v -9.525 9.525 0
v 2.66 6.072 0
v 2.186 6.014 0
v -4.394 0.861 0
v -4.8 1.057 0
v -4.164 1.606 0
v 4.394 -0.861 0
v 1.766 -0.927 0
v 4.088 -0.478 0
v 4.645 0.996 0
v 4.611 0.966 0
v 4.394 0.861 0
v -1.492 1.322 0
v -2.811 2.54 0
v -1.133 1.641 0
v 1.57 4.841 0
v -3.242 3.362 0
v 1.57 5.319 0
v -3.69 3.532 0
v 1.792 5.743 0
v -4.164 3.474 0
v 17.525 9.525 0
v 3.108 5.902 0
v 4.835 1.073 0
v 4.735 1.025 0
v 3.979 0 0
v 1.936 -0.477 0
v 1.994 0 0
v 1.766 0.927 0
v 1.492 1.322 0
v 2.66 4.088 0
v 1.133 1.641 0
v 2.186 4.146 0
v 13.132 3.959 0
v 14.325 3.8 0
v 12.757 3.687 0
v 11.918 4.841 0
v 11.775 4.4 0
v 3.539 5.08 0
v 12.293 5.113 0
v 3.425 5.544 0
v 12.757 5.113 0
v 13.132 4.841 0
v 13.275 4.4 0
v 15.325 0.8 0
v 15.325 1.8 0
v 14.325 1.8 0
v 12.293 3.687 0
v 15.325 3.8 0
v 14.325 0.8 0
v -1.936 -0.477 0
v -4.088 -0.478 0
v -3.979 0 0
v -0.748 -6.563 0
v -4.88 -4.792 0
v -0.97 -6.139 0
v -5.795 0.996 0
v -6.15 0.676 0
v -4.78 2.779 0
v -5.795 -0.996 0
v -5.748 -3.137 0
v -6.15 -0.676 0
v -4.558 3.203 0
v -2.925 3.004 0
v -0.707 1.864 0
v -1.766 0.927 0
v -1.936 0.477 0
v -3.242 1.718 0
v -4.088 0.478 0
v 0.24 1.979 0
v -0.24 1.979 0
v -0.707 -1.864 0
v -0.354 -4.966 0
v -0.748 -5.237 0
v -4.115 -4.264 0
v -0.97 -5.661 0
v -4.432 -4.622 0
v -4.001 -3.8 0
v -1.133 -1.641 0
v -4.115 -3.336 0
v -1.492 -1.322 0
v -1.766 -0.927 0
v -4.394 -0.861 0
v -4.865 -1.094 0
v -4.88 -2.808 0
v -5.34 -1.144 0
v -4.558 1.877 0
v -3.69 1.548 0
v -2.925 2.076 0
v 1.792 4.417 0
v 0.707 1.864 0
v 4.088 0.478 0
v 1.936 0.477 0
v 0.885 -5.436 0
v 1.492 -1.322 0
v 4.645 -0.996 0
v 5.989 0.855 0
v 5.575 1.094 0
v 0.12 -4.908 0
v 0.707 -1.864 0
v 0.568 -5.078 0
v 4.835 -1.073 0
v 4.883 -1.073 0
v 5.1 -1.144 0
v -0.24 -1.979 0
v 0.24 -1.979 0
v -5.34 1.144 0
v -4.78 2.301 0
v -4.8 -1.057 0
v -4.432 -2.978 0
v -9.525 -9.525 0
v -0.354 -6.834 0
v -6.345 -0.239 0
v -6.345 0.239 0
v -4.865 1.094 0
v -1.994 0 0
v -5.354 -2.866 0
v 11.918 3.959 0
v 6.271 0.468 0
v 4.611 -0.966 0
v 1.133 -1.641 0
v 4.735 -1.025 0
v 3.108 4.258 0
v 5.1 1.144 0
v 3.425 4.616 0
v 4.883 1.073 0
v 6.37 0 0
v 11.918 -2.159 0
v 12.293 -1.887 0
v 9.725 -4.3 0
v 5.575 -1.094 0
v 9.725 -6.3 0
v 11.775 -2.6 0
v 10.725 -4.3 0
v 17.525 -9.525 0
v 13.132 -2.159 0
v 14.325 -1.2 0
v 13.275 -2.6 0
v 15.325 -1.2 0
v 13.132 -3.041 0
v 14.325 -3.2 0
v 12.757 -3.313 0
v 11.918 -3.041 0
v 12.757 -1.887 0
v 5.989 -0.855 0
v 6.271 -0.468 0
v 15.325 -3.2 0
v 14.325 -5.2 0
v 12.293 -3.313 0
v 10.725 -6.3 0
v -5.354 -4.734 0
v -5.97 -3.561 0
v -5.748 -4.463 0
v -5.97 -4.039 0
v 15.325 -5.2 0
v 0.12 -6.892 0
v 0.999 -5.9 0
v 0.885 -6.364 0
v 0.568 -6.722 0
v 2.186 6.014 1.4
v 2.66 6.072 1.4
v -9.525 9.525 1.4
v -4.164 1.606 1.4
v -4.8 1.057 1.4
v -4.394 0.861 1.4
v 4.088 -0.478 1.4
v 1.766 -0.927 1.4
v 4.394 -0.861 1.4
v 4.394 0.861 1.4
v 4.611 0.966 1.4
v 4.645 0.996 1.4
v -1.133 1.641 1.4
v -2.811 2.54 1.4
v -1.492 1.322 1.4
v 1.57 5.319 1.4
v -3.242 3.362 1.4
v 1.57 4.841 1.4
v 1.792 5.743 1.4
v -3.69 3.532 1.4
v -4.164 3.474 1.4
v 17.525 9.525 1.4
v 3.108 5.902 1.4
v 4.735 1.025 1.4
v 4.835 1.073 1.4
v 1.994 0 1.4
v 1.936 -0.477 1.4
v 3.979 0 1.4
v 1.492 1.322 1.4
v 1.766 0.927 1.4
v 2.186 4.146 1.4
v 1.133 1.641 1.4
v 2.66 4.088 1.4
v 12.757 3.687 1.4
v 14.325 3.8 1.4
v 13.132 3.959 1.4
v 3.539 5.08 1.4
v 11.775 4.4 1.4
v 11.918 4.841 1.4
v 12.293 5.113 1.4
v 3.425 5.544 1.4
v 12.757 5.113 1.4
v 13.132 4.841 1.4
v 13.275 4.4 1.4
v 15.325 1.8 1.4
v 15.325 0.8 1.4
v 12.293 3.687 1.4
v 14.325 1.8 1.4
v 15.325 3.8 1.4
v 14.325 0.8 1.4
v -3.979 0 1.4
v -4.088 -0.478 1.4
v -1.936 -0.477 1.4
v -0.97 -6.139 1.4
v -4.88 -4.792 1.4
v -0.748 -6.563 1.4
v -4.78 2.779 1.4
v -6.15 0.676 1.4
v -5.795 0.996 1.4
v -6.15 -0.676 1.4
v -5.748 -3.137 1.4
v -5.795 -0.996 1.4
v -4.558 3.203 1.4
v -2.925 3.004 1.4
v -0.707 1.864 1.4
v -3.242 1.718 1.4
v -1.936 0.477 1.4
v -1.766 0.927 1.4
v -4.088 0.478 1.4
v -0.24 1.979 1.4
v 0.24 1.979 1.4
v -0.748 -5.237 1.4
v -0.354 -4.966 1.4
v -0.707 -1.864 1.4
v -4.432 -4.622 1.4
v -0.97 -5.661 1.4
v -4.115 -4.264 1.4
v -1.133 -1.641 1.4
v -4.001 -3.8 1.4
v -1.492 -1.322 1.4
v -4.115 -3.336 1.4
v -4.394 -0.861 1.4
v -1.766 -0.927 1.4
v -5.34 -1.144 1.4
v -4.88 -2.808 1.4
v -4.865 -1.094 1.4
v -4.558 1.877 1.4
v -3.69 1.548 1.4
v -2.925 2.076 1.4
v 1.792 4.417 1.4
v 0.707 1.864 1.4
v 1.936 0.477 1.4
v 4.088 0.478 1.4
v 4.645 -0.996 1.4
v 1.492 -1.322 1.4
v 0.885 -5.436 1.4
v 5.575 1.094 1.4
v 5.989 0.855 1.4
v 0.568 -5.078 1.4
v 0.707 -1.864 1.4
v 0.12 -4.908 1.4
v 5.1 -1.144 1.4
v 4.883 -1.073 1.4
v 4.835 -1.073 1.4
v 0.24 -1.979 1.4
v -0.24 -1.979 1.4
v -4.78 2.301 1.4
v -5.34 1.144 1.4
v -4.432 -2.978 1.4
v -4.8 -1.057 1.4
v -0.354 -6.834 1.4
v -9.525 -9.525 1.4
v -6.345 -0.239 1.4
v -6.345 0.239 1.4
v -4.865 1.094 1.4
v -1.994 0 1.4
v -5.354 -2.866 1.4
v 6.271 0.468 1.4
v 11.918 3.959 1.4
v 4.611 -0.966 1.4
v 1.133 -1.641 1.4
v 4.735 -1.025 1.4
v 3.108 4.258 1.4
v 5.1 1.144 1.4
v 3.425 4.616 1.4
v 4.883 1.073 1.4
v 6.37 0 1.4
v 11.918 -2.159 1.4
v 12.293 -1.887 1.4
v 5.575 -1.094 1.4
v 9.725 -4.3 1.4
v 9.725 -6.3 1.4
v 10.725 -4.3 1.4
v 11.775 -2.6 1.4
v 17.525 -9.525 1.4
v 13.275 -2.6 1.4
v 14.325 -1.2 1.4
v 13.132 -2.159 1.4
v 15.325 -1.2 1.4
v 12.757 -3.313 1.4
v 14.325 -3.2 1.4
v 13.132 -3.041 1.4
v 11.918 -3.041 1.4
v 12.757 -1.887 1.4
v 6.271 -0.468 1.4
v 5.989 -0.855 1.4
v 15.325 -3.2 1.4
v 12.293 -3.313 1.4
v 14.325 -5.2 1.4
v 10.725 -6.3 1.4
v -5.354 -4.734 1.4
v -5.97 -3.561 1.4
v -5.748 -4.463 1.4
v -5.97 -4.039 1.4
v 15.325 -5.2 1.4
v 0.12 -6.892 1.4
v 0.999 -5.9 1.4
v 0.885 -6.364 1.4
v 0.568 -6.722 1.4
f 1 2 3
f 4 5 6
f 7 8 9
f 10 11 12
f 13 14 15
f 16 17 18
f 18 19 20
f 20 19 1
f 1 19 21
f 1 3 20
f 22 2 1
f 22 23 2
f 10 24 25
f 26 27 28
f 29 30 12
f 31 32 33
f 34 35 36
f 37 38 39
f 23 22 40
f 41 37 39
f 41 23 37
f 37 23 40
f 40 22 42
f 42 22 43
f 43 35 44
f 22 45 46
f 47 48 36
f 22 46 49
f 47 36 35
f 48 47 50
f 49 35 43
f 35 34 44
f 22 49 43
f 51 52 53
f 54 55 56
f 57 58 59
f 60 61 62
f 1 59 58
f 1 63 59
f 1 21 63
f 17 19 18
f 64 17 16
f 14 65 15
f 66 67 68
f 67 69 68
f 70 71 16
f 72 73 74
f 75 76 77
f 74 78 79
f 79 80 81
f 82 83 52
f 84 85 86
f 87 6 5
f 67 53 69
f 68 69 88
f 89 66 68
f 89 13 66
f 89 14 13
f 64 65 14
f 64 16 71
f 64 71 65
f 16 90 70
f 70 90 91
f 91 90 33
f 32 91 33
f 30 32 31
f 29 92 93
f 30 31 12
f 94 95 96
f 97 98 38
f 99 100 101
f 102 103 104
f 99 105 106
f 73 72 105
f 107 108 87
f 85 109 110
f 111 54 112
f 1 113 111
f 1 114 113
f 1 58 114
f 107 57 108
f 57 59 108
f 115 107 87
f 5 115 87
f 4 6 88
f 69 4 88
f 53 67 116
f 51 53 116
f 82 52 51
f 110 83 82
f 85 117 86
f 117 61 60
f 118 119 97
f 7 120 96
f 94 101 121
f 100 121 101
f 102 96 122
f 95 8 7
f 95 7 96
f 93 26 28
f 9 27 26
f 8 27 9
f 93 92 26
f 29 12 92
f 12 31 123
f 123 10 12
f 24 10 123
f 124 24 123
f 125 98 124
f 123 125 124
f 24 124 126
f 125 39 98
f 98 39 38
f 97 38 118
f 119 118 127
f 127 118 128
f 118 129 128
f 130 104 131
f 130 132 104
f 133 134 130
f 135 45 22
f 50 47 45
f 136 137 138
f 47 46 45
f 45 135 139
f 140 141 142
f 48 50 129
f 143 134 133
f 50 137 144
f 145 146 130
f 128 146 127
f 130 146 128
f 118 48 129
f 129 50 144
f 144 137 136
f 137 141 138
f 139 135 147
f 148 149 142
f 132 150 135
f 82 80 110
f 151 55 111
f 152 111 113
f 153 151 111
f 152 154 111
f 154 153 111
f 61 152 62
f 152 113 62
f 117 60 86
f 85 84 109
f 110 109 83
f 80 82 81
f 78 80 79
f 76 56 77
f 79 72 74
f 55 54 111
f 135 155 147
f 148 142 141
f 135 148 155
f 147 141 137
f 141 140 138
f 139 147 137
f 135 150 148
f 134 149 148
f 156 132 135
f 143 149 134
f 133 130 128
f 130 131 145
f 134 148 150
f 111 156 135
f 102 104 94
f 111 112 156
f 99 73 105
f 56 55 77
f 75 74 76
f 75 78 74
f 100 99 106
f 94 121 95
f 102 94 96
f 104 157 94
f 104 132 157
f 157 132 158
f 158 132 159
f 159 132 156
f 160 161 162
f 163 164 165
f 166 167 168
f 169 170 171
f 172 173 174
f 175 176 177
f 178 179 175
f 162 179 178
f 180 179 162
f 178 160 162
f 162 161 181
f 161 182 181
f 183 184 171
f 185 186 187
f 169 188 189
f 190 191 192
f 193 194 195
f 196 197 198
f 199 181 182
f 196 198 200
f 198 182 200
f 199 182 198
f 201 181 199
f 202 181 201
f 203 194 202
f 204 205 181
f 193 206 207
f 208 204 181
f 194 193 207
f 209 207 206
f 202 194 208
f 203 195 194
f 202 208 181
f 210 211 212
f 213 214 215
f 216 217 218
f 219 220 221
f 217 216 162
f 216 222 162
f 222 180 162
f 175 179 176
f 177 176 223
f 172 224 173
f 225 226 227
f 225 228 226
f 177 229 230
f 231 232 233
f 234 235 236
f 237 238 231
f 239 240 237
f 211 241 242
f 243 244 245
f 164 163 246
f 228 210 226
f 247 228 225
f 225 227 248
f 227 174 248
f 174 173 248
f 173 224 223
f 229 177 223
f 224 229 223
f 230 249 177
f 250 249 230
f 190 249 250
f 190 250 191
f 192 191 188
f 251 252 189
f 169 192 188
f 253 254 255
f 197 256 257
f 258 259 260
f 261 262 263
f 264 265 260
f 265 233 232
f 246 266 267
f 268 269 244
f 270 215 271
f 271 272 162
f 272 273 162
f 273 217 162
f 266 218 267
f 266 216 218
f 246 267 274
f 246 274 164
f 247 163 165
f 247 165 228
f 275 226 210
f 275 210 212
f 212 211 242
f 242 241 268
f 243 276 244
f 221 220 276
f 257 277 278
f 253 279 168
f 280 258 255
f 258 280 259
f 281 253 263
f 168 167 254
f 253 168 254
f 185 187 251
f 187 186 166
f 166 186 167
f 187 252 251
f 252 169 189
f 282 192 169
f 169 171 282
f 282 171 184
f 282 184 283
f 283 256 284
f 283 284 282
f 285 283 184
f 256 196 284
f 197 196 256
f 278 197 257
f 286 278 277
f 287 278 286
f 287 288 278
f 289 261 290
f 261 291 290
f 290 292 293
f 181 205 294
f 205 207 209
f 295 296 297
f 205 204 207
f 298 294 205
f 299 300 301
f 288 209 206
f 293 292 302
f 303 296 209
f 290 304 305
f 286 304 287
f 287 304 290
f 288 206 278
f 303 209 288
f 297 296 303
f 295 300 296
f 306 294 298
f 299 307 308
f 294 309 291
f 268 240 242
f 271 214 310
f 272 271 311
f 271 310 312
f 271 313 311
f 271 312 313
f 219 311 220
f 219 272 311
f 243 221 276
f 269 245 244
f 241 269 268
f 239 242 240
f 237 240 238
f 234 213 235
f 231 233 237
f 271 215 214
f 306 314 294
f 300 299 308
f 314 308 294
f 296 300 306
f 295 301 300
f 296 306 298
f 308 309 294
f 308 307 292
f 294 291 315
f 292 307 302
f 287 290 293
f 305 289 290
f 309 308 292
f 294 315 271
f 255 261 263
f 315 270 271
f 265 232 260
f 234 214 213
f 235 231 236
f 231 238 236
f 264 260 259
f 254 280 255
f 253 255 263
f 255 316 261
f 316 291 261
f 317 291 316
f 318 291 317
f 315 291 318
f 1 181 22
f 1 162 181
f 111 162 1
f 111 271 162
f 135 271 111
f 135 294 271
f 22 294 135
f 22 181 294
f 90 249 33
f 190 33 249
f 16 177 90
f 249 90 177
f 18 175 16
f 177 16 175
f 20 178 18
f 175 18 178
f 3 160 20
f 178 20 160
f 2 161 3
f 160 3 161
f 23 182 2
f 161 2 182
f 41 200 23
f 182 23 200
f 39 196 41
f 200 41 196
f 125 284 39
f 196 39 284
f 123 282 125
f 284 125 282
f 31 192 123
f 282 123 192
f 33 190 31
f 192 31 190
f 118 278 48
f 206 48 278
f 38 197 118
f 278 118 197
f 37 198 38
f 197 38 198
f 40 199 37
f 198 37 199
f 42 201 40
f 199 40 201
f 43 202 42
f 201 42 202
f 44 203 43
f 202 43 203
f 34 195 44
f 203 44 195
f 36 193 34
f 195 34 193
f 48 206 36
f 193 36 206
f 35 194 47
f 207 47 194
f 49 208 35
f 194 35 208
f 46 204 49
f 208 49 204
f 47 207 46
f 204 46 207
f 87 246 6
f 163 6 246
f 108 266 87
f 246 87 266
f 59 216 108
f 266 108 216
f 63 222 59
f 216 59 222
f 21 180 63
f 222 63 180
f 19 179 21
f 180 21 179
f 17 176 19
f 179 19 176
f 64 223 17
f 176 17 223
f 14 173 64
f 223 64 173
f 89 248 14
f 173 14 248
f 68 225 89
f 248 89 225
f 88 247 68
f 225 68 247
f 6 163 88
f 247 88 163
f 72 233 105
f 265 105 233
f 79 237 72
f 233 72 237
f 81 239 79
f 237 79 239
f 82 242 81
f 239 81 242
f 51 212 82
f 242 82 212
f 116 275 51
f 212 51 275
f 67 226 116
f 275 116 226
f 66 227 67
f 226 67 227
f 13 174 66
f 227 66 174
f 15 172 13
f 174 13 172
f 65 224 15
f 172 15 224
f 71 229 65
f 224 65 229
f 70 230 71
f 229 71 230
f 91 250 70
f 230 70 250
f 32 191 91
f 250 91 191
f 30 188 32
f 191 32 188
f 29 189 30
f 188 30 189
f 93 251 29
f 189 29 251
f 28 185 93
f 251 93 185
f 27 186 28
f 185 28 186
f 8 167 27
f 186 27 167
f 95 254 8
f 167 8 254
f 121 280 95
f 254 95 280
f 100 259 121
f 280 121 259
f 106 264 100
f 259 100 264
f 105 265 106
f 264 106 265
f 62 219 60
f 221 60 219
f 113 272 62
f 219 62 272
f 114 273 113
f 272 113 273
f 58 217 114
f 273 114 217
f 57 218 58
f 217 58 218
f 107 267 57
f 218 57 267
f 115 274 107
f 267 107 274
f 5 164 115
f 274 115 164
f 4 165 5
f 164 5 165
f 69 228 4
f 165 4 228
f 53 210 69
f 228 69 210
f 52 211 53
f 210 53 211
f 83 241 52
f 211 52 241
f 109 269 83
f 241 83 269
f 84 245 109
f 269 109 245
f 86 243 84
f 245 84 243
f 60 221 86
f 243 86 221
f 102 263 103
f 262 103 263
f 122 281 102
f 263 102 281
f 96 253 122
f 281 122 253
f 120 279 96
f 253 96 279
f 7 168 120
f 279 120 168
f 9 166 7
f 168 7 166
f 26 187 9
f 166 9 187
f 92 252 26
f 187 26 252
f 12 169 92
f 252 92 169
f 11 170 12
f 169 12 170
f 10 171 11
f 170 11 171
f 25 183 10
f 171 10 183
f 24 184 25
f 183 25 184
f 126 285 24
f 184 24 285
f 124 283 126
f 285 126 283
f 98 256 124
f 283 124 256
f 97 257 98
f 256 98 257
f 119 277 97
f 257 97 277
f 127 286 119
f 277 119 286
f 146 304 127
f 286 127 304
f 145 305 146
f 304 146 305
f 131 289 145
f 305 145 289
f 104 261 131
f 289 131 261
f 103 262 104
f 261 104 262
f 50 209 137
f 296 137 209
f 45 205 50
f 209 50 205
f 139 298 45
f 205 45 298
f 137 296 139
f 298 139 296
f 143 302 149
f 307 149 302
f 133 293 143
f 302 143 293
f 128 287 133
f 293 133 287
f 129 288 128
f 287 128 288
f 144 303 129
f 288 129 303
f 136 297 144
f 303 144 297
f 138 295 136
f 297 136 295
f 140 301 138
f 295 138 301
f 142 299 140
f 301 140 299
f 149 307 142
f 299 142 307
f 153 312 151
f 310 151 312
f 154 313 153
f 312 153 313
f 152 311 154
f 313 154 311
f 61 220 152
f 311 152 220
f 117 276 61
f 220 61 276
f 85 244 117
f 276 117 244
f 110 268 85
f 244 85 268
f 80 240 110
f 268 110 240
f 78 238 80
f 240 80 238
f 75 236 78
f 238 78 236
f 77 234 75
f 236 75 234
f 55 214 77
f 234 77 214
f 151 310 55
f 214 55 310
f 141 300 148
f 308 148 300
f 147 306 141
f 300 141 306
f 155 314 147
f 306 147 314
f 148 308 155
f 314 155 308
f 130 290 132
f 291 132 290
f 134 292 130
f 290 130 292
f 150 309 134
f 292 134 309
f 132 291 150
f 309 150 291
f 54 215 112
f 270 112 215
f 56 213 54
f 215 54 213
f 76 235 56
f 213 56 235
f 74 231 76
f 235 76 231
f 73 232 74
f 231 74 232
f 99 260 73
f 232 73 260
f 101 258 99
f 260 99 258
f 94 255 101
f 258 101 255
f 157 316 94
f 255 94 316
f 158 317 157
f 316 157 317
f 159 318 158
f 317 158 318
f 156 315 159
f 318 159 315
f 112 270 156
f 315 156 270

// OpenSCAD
$fs=0.5;
$fa=1;
in=25.4;
g=0.05*in;
e=0.5;// added diameter to switch holes

linear_extrude(1.4) {
     difference() {
          union() {
               square(19.05, center=true);
               translate([19.05/2+3, 0]) square([10, 19.05], center=true);
          }

          // MX
          circle(d=0.157*in);
          translate([2*g, 4*g]) circle(d=0.059*in+e);
          translate([-3*g, 2*g]) circle(d=0.059*in+e);
          translate([-4*g, 0]) circle(d=0.067*in+e);
          translate([4*g, 0]) circle(d=0.067*in+e);

          // Choc
          circle(d=3.2);
          translate([0, -5.9]) circle(d=0.059*in+e);
          translate([-5, -3.8]) circle(d=0.059*in+e);
          translate([-5.22, 0]) circle(d=1.8+e);
          translate([5.22, 0]) circle(d=1.8+e);

          // PJ320A
          translate([19.05/2+3, 6]) {
               translate([0, -1.6]) circle(d=1.5);
               translate([0, -8.6]) circle(d=1.5);

               for (i=[-3.2, -6.2, -10.2]) translate([2.3, i]) square([1,2], center=true);
               translate([-2.3, -11.3]) square([1,2], center=true);
          }
     }
}
